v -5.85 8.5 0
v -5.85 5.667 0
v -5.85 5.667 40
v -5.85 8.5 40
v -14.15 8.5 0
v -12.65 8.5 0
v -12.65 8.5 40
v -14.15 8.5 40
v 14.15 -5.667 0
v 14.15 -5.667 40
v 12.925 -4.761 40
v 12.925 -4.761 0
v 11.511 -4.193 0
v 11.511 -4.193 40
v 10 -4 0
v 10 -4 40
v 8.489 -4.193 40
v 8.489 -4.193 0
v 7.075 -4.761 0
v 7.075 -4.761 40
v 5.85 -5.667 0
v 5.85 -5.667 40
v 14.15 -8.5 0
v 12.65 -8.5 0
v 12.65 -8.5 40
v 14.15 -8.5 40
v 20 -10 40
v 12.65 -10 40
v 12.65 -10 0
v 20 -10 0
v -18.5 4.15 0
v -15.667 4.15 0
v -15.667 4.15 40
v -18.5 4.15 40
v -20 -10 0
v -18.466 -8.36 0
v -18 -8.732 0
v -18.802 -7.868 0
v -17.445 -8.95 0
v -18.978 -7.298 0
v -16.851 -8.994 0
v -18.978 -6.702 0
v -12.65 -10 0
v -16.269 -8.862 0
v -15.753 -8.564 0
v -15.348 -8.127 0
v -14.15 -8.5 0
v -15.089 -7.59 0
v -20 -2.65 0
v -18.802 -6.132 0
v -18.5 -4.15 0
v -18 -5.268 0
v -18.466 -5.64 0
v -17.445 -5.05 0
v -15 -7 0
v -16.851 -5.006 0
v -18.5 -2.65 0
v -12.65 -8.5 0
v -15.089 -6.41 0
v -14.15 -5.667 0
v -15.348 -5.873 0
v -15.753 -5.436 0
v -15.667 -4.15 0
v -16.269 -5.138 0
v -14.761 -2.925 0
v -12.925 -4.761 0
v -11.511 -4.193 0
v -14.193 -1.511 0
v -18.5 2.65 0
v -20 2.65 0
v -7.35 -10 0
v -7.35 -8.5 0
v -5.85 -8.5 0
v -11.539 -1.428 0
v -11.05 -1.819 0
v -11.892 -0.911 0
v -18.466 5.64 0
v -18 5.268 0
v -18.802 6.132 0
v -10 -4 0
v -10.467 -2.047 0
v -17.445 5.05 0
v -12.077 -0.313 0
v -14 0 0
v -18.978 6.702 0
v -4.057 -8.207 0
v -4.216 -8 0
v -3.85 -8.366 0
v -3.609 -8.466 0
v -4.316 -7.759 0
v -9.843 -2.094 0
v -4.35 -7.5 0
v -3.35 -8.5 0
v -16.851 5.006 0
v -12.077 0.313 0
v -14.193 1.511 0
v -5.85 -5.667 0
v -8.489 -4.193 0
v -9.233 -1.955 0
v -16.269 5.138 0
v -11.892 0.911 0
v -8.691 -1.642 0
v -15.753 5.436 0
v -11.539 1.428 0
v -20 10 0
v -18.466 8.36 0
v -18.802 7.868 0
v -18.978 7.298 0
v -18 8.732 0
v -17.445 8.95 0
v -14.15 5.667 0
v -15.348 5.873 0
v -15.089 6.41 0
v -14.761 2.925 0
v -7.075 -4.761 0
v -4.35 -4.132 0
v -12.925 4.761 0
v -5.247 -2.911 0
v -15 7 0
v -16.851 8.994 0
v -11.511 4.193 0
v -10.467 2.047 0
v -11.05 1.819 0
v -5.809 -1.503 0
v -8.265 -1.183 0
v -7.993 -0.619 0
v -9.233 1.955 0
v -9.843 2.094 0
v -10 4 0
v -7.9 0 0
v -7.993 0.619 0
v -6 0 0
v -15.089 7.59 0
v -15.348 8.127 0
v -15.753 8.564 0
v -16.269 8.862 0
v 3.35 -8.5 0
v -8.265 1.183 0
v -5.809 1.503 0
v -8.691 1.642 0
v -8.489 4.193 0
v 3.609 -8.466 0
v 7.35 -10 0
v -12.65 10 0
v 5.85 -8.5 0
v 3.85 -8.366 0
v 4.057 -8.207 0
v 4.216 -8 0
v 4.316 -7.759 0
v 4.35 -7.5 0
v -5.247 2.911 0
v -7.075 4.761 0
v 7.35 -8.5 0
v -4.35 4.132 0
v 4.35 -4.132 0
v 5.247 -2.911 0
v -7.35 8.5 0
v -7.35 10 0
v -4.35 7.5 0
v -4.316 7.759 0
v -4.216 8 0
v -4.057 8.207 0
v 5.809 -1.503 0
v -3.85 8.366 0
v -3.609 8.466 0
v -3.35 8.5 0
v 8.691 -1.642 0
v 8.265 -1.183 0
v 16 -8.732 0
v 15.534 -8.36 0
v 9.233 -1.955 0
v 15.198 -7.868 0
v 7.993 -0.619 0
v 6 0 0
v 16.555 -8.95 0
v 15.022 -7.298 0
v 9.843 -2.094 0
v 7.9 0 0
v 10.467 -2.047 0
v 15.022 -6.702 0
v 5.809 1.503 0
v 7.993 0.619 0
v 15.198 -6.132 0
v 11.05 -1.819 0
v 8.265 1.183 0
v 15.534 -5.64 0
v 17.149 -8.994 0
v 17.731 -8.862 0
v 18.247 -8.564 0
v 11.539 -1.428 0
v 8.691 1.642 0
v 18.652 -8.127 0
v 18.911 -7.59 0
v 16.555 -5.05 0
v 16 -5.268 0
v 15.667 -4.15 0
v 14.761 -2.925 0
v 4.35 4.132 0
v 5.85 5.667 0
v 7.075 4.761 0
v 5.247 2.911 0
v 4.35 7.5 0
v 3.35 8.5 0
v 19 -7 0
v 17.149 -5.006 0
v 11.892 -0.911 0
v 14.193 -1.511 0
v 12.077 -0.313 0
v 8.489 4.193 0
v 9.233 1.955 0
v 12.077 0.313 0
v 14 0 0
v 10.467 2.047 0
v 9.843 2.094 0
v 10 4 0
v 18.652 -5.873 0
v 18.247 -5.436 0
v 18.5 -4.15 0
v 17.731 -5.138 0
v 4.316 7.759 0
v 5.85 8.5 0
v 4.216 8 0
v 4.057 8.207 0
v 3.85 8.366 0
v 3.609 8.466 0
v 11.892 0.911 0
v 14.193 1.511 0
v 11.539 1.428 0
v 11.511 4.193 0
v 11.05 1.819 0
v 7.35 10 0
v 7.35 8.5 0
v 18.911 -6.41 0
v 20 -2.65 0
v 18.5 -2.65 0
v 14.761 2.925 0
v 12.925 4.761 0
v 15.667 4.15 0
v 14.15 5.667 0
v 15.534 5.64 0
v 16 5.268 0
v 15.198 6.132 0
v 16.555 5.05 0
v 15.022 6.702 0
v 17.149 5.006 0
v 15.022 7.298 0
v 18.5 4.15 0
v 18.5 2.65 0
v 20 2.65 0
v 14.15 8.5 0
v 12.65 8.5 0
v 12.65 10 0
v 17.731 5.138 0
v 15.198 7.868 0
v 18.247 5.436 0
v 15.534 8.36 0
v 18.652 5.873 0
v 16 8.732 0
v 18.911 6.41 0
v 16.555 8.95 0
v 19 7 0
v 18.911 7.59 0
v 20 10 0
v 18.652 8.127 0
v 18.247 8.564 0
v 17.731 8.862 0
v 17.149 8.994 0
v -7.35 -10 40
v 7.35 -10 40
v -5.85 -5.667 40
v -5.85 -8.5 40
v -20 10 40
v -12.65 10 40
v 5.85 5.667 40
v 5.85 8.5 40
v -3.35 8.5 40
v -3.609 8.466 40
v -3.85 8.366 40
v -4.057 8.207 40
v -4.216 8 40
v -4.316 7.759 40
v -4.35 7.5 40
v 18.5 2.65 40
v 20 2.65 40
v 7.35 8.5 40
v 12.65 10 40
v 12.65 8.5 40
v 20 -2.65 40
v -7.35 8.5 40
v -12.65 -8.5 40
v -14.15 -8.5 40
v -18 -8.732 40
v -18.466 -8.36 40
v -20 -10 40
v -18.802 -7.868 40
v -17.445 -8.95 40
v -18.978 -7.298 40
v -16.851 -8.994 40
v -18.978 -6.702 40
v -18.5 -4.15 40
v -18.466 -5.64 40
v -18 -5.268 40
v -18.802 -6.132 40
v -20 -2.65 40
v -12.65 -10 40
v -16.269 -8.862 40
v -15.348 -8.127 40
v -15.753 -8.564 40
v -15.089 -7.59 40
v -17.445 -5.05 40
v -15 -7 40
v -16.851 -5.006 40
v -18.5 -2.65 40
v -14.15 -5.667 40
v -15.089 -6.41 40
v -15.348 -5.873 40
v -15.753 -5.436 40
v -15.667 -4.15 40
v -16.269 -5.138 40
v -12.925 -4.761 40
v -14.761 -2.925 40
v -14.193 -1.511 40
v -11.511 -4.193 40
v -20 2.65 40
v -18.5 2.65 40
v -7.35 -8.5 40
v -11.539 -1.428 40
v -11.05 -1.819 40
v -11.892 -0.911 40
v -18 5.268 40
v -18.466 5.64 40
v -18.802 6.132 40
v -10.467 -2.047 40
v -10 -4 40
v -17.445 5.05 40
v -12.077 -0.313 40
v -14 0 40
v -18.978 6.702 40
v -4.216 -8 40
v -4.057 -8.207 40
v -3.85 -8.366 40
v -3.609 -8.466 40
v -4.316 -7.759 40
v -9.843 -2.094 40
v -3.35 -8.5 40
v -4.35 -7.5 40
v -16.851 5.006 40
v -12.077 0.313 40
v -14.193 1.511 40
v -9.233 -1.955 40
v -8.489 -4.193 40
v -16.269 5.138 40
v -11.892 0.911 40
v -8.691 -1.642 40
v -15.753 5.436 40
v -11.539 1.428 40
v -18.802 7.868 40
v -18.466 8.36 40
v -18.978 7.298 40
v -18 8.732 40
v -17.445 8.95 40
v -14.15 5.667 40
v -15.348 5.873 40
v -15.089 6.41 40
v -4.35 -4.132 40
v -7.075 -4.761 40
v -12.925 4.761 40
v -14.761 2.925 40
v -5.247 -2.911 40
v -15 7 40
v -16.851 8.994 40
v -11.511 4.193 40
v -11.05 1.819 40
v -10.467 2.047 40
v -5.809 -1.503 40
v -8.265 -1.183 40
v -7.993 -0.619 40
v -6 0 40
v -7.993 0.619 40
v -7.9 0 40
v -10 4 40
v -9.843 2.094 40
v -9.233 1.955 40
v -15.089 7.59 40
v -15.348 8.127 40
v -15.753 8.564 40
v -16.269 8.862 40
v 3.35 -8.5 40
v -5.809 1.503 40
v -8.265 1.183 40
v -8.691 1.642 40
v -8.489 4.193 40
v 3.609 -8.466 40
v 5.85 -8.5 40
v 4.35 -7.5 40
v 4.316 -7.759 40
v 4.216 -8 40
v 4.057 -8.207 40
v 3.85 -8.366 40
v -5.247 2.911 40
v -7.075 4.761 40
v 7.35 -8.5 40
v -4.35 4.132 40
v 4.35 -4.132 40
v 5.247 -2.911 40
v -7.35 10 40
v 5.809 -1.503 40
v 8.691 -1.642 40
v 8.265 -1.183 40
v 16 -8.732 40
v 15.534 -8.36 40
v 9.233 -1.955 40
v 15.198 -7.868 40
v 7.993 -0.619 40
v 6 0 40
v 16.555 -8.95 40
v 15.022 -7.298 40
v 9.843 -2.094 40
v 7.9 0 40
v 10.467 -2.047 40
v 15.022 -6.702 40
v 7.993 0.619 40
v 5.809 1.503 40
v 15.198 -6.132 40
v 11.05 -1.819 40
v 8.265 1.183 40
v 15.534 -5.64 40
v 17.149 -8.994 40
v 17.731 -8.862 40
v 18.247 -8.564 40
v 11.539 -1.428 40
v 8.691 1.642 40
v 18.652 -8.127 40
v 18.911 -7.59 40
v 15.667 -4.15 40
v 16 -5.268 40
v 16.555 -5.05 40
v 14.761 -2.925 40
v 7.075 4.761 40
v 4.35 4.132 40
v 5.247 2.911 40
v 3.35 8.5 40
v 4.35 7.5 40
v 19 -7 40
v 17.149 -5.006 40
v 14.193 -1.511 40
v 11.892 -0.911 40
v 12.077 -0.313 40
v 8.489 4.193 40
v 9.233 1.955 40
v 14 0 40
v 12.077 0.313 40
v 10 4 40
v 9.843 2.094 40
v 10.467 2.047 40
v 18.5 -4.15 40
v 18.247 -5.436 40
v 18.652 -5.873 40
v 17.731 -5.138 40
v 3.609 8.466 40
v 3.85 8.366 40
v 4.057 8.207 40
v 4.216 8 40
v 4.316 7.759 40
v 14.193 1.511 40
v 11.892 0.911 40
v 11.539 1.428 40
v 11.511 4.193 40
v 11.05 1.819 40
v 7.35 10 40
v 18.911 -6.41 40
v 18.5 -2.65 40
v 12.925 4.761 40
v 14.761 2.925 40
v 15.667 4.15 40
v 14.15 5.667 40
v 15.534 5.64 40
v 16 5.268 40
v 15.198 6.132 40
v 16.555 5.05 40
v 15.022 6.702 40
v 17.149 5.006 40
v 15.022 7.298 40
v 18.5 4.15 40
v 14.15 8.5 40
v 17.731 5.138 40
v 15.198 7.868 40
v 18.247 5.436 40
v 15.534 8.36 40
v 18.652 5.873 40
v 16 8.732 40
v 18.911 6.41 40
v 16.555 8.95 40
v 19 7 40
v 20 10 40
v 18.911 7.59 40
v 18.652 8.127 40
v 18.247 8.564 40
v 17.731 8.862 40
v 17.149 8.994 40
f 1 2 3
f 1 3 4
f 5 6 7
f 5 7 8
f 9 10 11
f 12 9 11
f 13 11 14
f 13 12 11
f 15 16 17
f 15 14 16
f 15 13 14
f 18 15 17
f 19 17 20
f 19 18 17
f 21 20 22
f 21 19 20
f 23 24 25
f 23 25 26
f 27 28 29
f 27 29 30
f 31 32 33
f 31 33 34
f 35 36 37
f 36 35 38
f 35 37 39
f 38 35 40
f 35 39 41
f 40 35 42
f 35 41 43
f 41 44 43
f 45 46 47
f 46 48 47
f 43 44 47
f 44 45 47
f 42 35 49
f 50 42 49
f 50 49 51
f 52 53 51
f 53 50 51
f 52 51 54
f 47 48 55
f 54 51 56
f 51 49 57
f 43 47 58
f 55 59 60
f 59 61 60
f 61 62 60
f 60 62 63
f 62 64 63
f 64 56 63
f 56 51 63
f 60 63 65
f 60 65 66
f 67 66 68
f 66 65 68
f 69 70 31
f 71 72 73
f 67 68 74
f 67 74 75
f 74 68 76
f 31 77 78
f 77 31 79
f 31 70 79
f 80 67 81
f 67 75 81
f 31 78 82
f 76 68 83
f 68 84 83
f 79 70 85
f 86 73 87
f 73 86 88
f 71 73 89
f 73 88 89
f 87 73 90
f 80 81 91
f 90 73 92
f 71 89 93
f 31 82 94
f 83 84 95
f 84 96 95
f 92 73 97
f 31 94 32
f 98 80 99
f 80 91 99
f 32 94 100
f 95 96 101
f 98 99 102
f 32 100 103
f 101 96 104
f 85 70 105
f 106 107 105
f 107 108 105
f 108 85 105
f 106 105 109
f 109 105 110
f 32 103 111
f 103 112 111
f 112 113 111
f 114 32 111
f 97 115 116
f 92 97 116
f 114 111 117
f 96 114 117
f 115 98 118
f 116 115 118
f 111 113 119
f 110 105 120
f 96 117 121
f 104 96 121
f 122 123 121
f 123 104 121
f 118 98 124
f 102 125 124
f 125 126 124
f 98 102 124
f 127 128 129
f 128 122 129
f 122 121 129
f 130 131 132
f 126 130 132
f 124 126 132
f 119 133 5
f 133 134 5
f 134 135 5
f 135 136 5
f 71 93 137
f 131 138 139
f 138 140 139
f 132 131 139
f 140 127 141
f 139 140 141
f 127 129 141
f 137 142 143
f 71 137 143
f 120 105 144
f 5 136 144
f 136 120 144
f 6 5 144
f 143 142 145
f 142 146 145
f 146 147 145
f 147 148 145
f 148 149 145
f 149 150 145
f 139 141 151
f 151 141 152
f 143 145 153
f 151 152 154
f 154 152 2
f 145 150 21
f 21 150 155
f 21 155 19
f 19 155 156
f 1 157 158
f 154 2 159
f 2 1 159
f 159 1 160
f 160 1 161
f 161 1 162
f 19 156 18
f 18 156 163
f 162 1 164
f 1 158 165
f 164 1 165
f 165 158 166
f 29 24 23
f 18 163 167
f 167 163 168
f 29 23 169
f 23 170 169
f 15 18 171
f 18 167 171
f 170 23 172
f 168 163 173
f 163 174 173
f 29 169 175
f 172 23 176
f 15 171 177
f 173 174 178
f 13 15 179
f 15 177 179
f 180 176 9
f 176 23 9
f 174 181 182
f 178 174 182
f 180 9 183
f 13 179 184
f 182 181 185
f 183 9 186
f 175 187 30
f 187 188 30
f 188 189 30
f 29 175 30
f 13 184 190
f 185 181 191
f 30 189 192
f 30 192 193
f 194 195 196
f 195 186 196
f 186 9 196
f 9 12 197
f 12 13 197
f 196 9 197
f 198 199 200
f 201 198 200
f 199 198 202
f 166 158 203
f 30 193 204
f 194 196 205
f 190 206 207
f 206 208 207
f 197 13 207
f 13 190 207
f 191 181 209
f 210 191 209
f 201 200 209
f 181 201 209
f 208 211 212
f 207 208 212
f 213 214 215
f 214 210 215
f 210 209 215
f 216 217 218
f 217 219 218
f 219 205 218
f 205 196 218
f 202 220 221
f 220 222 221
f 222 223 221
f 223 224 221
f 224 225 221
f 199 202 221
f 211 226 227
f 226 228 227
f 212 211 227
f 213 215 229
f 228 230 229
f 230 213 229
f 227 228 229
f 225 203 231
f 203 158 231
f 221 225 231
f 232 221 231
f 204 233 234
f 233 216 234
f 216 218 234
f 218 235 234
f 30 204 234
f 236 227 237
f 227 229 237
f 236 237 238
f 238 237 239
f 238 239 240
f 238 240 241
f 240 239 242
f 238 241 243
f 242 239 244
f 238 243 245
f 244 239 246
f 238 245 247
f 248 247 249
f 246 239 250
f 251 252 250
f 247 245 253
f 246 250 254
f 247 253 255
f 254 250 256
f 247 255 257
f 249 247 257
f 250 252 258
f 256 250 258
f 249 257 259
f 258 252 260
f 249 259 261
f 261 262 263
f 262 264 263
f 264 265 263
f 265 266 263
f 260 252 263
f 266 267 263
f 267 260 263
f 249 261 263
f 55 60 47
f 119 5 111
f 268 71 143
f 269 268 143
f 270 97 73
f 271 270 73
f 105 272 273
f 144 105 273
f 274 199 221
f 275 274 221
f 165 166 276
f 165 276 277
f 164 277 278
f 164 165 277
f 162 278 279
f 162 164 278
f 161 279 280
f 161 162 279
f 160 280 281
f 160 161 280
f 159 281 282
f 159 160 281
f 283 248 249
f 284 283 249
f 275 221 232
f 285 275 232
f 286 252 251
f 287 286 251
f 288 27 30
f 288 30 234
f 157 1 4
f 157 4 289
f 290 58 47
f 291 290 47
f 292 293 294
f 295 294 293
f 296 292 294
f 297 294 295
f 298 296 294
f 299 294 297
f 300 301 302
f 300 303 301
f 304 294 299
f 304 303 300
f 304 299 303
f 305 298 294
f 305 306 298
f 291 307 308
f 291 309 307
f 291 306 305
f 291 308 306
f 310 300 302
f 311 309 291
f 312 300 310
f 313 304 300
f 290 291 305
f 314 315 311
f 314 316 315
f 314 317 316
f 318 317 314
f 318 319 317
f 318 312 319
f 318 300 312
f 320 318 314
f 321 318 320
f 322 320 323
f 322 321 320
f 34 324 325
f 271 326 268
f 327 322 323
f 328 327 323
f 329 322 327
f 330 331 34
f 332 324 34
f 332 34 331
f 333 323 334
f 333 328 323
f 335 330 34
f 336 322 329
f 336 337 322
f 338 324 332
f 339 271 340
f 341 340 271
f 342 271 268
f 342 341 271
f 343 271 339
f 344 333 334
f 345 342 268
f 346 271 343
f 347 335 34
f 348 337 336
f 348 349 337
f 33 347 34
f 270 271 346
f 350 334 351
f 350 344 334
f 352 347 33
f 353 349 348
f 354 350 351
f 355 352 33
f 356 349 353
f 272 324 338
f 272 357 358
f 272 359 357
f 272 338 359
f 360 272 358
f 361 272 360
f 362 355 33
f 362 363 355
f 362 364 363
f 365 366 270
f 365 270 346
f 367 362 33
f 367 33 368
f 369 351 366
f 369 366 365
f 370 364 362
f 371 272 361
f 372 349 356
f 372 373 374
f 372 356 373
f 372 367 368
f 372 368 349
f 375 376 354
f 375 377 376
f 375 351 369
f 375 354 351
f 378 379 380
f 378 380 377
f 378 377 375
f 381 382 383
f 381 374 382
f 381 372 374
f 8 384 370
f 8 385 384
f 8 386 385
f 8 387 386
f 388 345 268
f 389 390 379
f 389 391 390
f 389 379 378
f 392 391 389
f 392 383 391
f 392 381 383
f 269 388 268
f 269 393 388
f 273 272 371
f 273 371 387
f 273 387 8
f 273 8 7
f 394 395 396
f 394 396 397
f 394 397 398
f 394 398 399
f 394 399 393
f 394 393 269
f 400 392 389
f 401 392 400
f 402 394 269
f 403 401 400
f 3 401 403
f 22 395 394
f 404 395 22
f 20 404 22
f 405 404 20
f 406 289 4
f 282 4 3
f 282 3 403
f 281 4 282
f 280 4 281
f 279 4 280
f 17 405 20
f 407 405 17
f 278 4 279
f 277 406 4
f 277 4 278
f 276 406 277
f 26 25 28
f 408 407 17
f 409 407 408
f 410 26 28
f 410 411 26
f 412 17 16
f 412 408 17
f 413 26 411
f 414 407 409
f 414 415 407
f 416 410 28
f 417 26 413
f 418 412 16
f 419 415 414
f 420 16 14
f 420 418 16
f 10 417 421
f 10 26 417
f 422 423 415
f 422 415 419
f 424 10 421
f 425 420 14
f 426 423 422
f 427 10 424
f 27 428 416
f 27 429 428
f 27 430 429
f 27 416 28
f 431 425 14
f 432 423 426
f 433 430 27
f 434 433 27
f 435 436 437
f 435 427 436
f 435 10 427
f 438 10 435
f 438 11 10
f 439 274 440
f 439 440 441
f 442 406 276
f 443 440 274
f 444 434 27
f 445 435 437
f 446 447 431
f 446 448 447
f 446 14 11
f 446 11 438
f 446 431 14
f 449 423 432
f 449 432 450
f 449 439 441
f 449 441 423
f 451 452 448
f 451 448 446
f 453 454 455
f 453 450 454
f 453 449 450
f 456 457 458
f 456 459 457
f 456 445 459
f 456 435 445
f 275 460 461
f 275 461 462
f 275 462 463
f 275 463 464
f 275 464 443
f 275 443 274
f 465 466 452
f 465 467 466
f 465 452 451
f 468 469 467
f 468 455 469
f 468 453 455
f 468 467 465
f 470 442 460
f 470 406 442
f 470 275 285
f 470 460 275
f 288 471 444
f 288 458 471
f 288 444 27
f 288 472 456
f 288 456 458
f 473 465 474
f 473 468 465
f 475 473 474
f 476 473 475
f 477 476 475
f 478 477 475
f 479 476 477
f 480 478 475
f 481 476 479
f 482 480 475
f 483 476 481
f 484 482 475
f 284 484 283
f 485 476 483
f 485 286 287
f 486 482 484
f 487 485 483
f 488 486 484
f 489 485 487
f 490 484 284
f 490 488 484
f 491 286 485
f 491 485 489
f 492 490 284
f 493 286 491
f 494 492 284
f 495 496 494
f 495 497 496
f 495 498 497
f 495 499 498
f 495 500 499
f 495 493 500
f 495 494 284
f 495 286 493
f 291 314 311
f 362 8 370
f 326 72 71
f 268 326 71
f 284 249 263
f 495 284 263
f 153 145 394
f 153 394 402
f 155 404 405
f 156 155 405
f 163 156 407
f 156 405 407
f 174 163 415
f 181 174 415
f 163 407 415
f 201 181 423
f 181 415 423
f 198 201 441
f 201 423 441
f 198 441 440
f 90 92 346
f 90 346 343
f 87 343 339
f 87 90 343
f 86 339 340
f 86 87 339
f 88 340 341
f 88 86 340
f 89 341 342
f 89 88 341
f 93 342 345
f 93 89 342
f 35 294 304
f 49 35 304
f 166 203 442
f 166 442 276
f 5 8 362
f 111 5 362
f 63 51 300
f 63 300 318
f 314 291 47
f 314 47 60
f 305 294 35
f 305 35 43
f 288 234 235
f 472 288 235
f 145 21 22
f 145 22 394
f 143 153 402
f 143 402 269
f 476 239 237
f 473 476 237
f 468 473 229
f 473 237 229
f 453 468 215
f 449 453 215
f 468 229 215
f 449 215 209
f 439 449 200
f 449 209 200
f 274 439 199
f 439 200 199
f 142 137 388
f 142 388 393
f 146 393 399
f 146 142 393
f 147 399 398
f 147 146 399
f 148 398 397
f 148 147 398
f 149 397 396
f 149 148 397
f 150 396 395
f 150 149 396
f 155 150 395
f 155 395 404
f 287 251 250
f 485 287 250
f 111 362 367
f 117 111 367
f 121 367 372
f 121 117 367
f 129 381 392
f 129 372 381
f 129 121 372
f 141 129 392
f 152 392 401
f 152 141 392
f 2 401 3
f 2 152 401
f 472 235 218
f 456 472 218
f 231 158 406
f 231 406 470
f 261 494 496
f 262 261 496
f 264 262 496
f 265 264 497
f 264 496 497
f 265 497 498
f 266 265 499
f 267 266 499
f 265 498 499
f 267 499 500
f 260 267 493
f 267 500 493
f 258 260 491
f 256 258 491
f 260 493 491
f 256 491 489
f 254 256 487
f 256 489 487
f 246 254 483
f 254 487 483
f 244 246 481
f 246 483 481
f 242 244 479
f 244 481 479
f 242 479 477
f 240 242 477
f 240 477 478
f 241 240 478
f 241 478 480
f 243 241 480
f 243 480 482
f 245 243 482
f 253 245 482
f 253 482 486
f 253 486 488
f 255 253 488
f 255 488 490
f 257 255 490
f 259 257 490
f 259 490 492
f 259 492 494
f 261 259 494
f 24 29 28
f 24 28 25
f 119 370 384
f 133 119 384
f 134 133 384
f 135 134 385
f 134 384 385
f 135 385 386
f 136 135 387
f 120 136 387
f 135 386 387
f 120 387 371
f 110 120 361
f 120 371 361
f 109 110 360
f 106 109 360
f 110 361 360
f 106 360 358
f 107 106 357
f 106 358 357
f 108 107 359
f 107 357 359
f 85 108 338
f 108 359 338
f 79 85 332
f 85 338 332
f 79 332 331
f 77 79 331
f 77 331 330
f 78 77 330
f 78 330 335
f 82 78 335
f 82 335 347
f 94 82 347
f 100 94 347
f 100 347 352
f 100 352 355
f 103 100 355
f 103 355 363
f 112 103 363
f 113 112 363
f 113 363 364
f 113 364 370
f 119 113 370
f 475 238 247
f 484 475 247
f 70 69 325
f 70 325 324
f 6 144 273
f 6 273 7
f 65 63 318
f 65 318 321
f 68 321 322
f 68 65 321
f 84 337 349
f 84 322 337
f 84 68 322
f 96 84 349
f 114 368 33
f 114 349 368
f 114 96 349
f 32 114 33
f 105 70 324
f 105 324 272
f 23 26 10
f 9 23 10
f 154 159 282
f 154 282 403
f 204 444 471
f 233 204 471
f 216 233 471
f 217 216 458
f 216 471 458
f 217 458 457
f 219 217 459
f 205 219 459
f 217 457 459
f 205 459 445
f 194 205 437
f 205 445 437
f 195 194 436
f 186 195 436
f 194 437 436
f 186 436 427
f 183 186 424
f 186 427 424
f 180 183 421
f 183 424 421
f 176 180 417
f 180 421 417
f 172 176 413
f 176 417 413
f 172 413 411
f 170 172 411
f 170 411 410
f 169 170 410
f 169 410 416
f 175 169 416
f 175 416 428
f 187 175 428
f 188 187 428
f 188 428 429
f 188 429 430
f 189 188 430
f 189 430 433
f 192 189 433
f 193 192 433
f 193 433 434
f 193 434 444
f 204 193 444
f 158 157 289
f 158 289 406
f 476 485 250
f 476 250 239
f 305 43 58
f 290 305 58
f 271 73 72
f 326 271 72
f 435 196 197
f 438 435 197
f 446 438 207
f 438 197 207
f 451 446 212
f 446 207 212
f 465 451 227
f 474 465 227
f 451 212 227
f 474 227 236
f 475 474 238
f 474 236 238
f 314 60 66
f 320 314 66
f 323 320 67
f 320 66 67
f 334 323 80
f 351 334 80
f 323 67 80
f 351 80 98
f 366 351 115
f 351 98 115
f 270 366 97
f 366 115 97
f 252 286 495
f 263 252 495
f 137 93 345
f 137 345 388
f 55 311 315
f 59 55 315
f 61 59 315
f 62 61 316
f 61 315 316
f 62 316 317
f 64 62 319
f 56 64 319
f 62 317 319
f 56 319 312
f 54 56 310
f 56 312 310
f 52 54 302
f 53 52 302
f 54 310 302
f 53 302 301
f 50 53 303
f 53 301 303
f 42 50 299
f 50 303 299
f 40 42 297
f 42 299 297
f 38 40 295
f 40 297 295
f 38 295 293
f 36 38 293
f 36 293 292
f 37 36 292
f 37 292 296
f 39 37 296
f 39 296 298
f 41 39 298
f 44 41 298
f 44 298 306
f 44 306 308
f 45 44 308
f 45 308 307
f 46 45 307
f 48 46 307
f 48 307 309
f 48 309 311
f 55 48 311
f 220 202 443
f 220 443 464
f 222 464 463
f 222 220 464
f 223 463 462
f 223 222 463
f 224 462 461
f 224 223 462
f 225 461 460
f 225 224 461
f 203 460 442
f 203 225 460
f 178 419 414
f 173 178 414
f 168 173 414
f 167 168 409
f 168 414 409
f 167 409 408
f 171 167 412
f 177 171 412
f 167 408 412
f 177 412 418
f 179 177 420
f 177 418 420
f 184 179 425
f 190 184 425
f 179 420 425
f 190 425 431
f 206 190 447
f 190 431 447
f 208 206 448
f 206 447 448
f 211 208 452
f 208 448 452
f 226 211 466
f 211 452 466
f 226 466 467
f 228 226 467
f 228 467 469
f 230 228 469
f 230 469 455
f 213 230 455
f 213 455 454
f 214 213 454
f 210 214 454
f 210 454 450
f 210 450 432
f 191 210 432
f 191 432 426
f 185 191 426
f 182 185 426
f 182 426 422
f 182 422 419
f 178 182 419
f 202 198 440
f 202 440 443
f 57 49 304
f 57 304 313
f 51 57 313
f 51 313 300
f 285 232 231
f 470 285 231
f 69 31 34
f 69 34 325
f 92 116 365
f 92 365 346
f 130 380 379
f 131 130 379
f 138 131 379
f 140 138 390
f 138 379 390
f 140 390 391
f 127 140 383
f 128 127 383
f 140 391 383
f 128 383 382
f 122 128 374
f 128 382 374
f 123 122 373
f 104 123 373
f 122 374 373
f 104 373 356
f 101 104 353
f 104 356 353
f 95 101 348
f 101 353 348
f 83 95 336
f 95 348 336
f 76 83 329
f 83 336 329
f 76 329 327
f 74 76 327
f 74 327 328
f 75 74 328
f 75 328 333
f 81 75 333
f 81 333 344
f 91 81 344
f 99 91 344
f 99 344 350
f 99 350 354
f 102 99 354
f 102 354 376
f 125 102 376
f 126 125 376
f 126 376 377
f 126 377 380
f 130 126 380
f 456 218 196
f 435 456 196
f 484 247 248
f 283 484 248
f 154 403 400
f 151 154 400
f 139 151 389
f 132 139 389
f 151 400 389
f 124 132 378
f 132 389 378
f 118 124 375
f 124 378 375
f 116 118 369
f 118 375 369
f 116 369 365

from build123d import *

# Parameters (mm, degrees)
SKETCH_1_W          = 40
SKETCH_1_H          = 20
EXTRUDE_1_DEPTH     = 40
SKETCH_2_R          = 2
SKETCH_2_R_2        = 6
SKETCH_2_R_3        = 2.1
CUT_EXTRUDE_1_DEPTH = 46.82575695
CUT_EXTRUDE_2_DEPTH = 46.82575695
CUT_EXTRUDE_3_DEPTH = 46.82575695


with BuildPart() as part:
    # 스케치1 → 보스-돌출1 (new body)
    with BuildSketch(Plane.XY):
        Rectangle(SKETCH_1_W, SKETCH_1_H)
    extrude(amount=EXTRUDE_1_DEPTH)

    # 스케치2 → 컷-돌출1 (cut, through all)
    with BuildSketch(Plane.XY.offset(40)):
        with Locations((-17, 7)):
            Circle(SKETCH_2_R)
        with Locations((-17, -7)):
            Circle(SKETCH_2_R)
        with Locations((17, -7)):
            Circle(SKETCH_2_R)
        with Locations((17, 7)):
            Circle(SKETCH_2_R)
        Circle(SKETCH_2_R_2)
        with Locations((-10, 0)):
            Circle(SKETCH_2_R_3)
        with Locations(Location((10, 0, 0), (0, 0, 180))):
            Circle(SKETCH_2_R_3)
    extrude(amount=-CUT_EXTRUDE_1_DEPTH, mode=Mode.SUBTRACT)

    # 스케치3 → 컷-돌출2 (cut, through all)
    with BuildSketch(Plane(origin=(0, 0, 0), x_dir=(-1, 0, 0), z_dir=(0, 0, -1))):
        with BuildLine():
            Line((-20, 2.65), (-20, -2.65))
            Line((-20, -2.65), (-18.5, -2.65))
            Line((-18.5, -2.65), (-18.5, -4.15))
            Line((-18.5, -4.15), (-15.666698718, -4.15))
            ThreePointArc((-15.666698718, -4.15), (-14, 0), (-15.666698718, 4.15))
            Line((-15.666698718, 4.15), (-18.5, 4.15))
            Line((-18.5, 4.15), (-18.5, 2.65))
            Line((-18.5, 2.65), (-20, 2.65))
        make_face()
        with BuildLine():
            Line((-14.15, 8.5), (-14.15, 5.666698718))
            ThreePointArc((-14.15, 5.666698718), (-10, 4), (-5.85, 5.666698718))
            Line((-5.85, 5.666698718), (-5.85, 8.5))
            Line((-5.85, 8.5), (-7.35, 8.5))
            Line((-7.35, 8.5), (-7.35, 10))
            Line((-7.35, 10), (-12.65, 10))
            Line((-12.65, 10), (-12.65, 8.5))
            Line((-12.65, 8.5), (-14.15, 8.5))
        make_face()
        with BuildLine():
            Line((-12.65, -8.5), (-14.15, -8.5))
            Line((-14.15, -8.5), (-14.15, -5.666698718))
            ThreePointArc((-14.15, -5.666698718), (-10, -4), (-5.85, -5.666698718))
            Line((-5.85, -5.666698718), (-5.85, -8.5))
            Line((-5.85, -8.5), (-7.35, -8.5))
            Line((-7.35, -8.5), (-7.35, -10))
            Line((-7.35, -10), (-12.65, -10))
            Line((-12.65, -10), (-12.65, -8.5))
        make_face()
        with BuildLine():
            Line((14.15, -8.5), (14.15, -5.666698718))
            ThreePointArc((14.15, -5.666698718), (10, -4), (5.85, -5.666698718))
            Line((5.85, -5.666698718), (5.85, -8.5))
            Line((5.85, -8.5), (7.35, -8.5))
            Line((7.35, -8.5), (7.35, -10))
            Line((7.35, -10), (12.65, -10))
            Line((12.65, -10), (12.65, -8.5))
            Line((12.65, -8.5), (14.15, -8.5))
        make_face()
        with BuildLine():
            Line((12.65, 8.5), (14.15, 8.5))
            Line((14.15, 8.5), (14.15, 5.666698718))
            ThreePointArc((14.15, 5.666698718), (10, 4), (5.85, 5.666698718))
            Line((5.85, 5.666698718), (5.85, 8.5))
            Line((5.85, 8.5), (7.35, 8.5))
            Line((7.35, 8.5), (7.35, 10))
            Line((7.35, 10), (12.65, 10))
            Line((12.65, 10), (12.65, 8.5))
        make_face()
        with BuildLine():
            Line((18.5, -4.15), (15.666698718, -4.15))
            ThreePointArc((15.666698718, -4.15), (14, 0), (15.666698718, 4.15))
            Line((15.666698718, 4.15), (18.5, 4.15))
            Line((18.5, 4.15), (18.5, 2.65))
            Line((18.5, 2.65), (20, 2.65))
            Line((20, 2.65), (20, -2.65))
            Line((20, -2.65), (18.5, -2.65))
            Line((18.5, -2.65), (18.5, -4.15))
        make_face()
    extrude(amount=-CUT_EXTRUDE_2_DEPTH, mode=Mode.SUBTRACT)

    # 스케치4 → 컷-돌출3 (cut, through all)
    with BuildSketch(Plane(origin=(0, 0, 0), x_dir=(-1, 0, 0), z_dir=(0, 0, -1))):
        with BuildLine():
            Line((-3.35, 8.5), (3.35, 8.5))
            ThreePointArc((3.35, 8.5), (4.057106781, 8.207106781), (4.35, 7.5))
            Line((4.35, 7.5), (4.35, -7.5))
            ThreePointArc((4.35, -7.5), (4.057106781, -8.207106781), (3.35, -8.5))
            Line((3.35, -8.5), (-3.35, -8.5))
            ThreePointArc((-3.35, -8.5), (-4.057106781, -8.207106781), (-4.35, -7.5))
            Line((-4.35, -7.5), (-4.35, 7.5))
            ThreePointArc((-4.35, 7.5), (-4.057106781, 8.207106781), (-3.35, 8.5))
        make_face()
    extrude(amount=-CUT_EXTRUDE_3_DEPTH, mode=Mode.SUBTRACT)


solid = part.part
